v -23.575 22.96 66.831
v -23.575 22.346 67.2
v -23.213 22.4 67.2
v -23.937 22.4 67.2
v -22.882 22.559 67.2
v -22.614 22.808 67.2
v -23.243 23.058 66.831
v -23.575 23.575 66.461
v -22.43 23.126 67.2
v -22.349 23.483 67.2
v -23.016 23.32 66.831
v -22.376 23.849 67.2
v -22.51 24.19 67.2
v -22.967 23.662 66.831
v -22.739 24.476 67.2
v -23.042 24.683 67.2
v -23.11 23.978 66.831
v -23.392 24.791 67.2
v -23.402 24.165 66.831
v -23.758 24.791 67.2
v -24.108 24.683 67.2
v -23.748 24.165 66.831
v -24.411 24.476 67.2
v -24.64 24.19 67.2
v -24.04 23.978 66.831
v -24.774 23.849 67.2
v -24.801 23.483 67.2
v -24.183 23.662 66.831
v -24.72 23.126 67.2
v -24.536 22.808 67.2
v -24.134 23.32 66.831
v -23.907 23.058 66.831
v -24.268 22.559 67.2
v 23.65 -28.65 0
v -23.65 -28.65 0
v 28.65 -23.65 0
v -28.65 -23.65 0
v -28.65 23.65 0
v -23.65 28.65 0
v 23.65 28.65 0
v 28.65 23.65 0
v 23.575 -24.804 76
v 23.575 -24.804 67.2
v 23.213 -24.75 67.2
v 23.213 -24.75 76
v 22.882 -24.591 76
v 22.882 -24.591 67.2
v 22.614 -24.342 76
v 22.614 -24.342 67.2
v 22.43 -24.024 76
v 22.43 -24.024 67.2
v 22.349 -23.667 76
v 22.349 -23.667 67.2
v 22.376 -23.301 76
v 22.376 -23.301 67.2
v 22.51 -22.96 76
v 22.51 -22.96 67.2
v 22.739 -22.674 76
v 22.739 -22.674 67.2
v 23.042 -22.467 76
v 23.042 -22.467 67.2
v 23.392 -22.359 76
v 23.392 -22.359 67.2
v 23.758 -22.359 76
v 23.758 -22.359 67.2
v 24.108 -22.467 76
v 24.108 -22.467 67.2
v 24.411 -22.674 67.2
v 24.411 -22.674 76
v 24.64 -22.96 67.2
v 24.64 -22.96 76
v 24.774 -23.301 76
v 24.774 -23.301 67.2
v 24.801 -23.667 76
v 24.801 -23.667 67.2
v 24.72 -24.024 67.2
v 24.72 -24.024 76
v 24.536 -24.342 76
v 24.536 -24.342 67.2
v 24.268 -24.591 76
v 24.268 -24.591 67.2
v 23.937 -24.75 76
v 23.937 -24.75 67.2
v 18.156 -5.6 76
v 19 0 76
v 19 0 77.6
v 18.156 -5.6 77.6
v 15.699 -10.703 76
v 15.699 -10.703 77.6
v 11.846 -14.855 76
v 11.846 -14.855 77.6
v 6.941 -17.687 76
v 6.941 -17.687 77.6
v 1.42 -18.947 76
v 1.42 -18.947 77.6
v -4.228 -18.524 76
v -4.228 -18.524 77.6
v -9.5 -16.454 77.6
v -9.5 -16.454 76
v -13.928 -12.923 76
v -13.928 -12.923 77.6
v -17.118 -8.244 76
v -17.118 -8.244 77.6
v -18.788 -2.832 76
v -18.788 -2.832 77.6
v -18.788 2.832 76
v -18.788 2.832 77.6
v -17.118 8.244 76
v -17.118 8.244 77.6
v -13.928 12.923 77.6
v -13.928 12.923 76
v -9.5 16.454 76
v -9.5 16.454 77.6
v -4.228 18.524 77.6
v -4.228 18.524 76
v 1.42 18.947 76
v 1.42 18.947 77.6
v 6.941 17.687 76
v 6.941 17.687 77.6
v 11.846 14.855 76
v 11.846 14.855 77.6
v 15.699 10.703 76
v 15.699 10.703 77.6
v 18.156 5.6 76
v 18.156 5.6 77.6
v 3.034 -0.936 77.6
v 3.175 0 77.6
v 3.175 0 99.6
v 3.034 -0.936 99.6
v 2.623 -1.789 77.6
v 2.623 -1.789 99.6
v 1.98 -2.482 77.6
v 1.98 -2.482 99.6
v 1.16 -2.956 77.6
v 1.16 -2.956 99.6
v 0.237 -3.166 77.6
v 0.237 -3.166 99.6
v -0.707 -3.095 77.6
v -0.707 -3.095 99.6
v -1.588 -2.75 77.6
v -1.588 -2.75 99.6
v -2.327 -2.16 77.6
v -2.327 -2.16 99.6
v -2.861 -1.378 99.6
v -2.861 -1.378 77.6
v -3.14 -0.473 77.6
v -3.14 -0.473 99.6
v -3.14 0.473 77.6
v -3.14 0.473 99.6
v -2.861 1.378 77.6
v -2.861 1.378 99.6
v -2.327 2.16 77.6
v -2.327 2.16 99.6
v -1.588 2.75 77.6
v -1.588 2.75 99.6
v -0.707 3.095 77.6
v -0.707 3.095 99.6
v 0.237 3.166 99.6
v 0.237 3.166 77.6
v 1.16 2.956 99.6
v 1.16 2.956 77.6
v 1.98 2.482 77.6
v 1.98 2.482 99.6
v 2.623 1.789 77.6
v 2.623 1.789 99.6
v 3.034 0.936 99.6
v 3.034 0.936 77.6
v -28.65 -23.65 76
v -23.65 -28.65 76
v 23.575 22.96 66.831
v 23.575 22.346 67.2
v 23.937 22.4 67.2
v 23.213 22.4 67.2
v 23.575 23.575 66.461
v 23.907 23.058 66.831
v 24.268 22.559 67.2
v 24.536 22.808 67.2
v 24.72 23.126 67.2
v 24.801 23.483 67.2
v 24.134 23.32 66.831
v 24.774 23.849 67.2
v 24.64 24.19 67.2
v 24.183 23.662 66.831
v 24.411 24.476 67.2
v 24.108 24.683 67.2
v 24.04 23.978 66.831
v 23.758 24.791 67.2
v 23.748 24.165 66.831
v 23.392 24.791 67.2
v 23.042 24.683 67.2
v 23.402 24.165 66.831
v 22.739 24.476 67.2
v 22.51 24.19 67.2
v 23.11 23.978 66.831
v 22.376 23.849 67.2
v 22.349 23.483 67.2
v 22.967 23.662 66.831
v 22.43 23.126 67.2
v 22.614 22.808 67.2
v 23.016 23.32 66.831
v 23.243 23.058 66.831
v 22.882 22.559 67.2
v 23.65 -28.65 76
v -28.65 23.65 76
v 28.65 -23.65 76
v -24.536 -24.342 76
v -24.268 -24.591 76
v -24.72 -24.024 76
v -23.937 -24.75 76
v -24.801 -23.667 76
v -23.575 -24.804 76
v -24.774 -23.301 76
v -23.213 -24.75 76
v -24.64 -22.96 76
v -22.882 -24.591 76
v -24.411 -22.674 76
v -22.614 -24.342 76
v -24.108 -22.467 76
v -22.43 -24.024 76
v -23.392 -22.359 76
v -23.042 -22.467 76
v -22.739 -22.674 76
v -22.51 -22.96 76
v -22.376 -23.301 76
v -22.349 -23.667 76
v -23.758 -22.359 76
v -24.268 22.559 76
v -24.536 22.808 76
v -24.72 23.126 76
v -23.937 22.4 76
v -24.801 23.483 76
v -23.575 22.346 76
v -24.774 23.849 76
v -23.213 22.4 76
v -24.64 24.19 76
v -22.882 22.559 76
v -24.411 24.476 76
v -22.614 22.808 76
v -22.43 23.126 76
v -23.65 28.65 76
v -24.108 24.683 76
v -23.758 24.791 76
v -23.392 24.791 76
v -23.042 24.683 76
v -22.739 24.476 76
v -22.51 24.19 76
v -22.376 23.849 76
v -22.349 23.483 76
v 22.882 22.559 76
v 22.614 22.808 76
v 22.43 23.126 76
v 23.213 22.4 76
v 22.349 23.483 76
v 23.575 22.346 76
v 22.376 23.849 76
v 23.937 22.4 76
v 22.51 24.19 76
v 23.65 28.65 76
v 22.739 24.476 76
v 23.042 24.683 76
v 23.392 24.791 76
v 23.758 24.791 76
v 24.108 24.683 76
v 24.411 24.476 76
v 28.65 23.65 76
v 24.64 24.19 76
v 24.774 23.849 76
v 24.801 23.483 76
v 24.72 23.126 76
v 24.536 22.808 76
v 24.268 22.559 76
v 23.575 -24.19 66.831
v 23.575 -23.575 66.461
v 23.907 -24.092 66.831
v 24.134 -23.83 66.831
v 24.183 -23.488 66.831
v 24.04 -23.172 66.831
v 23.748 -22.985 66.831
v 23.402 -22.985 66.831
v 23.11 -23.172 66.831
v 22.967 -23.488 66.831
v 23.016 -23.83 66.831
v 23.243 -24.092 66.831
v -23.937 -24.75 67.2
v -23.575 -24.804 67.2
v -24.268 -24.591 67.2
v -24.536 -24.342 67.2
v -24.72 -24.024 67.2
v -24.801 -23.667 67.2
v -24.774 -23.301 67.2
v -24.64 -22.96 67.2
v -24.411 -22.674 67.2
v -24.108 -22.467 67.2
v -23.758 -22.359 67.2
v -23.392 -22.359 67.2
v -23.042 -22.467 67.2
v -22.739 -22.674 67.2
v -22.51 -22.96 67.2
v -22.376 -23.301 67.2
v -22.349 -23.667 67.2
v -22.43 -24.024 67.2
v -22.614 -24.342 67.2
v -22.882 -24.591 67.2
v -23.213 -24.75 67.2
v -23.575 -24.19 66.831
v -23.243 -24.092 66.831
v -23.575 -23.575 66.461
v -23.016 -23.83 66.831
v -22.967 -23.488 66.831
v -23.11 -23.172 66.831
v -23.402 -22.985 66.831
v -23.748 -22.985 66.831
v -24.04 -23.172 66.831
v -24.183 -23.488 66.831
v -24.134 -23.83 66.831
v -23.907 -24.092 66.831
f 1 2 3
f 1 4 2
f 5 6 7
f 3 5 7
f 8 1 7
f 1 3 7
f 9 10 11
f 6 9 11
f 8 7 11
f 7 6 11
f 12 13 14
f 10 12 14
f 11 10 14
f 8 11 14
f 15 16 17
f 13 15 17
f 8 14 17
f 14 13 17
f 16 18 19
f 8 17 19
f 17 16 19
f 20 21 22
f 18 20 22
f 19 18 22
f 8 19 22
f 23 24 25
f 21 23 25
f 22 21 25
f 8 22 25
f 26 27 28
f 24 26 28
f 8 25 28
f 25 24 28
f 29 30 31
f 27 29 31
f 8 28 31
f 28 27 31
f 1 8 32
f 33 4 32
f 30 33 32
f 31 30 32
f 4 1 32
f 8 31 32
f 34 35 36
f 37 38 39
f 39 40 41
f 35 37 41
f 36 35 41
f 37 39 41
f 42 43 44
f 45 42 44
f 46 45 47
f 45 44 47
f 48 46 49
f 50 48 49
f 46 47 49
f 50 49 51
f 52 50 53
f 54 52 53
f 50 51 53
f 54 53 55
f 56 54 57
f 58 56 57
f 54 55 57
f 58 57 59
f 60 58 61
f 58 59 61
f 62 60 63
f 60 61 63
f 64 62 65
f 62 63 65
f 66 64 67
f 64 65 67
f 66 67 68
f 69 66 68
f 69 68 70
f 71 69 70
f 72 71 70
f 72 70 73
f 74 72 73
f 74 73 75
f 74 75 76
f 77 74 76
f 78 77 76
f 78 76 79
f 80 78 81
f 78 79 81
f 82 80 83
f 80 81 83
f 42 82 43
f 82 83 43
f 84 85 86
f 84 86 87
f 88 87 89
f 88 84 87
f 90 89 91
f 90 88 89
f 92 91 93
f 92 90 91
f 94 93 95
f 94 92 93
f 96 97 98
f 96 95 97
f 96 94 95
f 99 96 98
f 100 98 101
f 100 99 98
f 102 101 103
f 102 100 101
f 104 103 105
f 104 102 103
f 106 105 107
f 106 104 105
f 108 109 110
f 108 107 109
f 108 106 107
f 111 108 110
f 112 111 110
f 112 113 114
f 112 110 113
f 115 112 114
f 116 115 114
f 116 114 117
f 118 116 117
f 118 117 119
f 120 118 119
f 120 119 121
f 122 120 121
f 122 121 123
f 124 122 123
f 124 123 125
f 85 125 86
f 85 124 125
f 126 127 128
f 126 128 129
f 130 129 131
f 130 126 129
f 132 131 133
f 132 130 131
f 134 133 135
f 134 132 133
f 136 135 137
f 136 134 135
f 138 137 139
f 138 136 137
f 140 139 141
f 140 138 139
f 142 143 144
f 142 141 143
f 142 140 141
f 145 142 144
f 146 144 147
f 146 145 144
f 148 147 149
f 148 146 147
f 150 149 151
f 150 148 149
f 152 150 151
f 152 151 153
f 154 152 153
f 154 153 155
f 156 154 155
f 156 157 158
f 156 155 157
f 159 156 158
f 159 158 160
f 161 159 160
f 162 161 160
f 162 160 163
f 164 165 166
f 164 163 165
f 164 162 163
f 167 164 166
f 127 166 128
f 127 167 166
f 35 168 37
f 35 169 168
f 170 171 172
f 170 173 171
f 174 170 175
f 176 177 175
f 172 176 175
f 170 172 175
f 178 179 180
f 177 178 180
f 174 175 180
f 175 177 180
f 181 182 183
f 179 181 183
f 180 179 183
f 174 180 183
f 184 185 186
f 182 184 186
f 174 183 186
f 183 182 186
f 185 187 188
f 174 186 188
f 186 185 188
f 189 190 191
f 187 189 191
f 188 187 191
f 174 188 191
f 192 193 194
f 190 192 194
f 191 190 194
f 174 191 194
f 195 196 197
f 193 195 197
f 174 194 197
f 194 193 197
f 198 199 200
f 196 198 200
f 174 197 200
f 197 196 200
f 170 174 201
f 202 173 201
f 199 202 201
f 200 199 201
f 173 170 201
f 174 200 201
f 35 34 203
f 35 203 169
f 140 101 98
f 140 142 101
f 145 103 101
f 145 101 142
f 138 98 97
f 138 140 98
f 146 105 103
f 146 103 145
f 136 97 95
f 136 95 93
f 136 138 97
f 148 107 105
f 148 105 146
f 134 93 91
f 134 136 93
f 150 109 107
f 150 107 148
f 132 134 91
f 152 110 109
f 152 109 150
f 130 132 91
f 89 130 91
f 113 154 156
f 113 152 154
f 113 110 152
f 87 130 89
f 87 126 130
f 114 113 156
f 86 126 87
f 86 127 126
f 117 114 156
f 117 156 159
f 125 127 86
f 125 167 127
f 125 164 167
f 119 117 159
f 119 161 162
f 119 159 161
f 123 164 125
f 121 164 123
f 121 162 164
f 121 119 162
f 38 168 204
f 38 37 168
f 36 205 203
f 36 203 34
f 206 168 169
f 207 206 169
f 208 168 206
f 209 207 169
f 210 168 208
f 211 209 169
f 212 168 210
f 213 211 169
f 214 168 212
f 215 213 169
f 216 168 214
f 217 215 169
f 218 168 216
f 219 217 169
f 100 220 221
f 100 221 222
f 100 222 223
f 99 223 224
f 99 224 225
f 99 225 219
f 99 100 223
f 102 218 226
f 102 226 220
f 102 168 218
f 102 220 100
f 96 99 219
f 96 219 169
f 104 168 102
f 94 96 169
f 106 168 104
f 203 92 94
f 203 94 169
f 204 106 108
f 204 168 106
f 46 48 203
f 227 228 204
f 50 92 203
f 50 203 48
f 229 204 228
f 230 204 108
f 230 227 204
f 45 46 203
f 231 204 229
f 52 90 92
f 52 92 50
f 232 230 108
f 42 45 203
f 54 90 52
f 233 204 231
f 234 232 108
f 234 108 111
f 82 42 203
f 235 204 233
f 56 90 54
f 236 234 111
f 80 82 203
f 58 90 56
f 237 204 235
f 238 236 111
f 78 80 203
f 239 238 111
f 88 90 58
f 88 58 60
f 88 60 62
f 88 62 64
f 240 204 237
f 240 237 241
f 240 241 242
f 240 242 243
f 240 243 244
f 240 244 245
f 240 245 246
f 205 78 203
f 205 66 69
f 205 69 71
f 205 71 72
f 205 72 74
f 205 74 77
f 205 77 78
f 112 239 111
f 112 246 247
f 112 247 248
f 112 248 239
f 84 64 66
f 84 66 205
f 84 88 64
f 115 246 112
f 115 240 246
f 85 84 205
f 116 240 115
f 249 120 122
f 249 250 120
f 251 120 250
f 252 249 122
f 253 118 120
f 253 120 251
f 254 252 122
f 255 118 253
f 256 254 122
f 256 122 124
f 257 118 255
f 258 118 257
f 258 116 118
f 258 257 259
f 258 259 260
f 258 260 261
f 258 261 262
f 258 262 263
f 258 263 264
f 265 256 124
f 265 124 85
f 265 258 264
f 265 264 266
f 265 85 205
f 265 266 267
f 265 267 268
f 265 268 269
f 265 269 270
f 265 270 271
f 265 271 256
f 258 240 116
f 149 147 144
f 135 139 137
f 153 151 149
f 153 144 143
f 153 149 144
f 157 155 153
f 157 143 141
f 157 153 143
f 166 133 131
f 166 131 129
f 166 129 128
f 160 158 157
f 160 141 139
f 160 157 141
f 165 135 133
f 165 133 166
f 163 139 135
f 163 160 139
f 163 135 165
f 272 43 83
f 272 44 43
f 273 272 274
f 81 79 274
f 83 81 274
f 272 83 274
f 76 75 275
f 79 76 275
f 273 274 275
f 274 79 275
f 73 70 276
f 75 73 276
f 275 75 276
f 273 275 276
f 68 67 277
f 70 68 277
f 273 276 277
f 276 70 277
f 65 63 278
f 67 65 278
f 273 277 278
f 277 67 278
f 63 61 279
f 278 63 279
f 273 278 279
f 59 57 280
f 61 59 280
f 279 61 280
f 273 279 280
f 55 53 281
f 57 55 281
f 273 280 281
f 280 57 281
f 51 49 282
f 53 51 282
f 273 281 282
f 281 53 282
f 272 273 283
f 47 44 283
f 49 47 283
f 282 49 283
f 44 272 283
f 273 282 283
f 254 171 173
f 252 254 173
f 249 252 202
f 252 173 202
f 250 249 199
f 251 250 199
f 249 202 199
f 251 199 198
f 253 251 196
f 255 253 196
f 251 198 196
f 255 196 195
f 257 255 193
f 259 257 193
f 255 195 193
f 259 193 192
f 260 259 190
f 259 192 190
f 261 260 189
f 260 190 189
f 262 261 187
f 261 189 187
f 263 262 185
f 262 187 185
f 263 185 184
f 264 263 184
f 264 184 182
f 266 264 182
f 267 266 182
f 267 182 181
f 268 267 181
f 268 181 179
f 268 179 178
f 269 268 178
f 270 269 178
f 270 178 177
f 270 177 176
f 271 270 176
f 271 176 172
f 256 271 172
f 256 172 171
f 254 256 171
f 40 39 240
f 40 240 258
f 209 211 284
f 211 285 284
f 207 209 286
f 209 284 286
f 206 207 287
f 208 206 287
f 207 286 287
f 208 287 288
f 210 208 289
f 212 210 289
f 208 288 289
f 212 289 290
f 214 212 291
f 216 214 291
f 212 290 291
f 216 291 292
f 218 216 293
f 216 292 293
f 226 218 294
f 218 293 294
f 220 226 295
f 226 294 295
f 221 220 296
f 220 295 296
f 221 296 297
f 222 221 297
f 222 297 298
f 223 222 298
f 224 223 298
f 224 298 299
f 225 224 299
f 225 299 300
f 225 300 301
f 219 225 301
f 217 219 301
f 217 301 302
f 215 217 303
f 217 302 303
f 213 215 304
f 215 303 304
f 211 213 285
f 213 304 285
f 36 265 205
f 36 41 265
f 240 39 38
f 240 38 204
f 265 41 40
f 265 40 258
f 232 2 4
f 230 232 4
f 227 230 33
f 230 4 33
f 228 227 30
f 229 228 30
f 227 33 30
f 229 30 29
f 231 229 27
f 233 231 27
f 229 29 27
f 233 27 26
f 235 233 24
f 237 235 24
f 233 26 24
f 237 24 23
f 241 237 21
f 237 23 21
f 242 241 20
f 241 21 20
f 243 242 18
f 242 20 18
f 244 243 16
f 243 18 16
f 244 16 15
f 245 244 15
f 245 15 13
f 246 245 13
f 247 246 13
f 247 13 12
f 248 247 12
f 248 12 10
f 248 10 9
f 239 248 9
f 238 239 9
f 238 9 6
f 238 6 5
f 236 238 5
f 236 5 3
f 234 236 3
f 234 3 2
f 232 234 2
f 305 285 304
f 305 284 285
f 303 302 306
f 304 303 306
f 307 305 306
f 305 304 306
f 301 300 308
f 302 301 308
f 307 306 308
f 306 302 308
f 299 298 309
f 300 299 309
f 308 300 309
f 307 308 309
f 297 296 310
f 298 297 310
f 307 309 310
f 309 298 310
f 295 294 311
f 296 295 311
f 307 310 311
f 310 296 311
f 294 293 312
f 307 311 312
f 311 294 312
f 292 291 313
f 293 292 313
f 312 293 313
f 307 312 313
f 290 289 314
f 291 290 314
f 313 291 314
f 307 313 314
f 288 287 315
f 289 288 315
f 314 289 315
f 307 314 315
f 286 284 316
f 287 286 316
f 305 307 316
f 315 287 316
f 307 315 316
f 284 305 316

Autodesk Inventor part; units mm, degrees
ref_plane "YZ Plane" through (0, 0, 0) normal (1, 0, 0) x (0, 1, 0)
ref_plane "XZ Plane" through (0, 0, 0) normal (0, 1, 0) x (-1, 0, 0)
ref_plane "XY Plane" through (0, 0, 0) normal (0, 0, 1) x (1, 0, 0)
sketch "Skizze1" plane through (0, 0, 0) normal (0, 0, 1) x (1, 0, 0)
  line L0 (-40.11, 0) -> (40.11, 0) projected
  line L1 (0, -40.11) -> (0, 40.11) projected
  line L2 (28.65, -28.65) -> (-28.65, -28.65)
  line L3 (-28.65, -28.65) -> (-28.65, 28.65)
  line L4 (-28.65, 28.65) -> (28.65, 28.65)
  line L5 (28.65, 28.65) -> (28.65, -28.65)
  line L6 (28.65, -28.65) -> (-28.65, 28.65) construction
  line L7 (-28.65, -28.65) -> (28.65, 28.65) construction
  point P0 (0, 0)
  dimension "d0" = 57.3
  dimension "d1" = 57.3
extrude "Extrusion1" add sketch "Skizze1" along normal blind 76
sketch "Skizze2" plane through (0, 0, 76) normal (0, 0, 1) x (1, 0, 0)
  circle A0 centre (0, 0) radius 19
  dimension "d4" = 38
extrude "Extrusion2" add sketch "Skizze2" along normal blind 1.6
sketch "Skizze3" plane through (0, 0, 77.6) normal (0, 0, 1) x (1, 0, 0)
  circle A0 centre (0, 0) radius 3.175
  dimension "d7" = 6.35
extrude "Extrusion3" add sketch "Skizze3" along normal blind 22
sketch "Skizze4" plane through (0, 0, 76) normal (0, 0, 1) x (1, 0, 0)
  circle A0 centre (0, 0) radius 19 projected
  line L0 (28.65, 28.65) -> (-28.65, 28.65) projected
  line L1 (-28.65, 28.65) -> (-28.65, -28.65) projected
  line L2 (-28.65, -28.65) -> (28.65, -28.65) projected
  line L3 (28.65, -28.65) -> (28.65, 28.65) projected
  line L4 (23.575, -23.575) -> (-23.575, -23.575)
  line L5 (-23.575, -23.575) -> (-23.575, 23.575)
  line L6 (-23.575, 23.575) -> (23.575, 23.575)
  line L7 (23.575, 23.575) -> (23.575, -23.575)
  line L8 (23.575, -23.575) -> (-23.575, 23.575) construction
  line L9 (-23.575, -23.575) -> (23.575, 23.575) construction
  dimension "d10" = 47.15
  dimension "d11" = 47.15
hole "Bohrung1" at (-23.575, 23.575, 76) at (23.575, 23.575, 76) at (23.575, -23.575, 76) at (-23.575, -23.575, 76) direction (0, 0, -1) diameter 2.459 depth 8.8 tip angle 118 thread size "M3x0.5" class "6H" standard "ISO Metric profile"
chamfer "Fasen1" distance 5 angle 45 4 edges at (28.65, -28.65, 38) (28.65, 28.65, 38) (-28.65, 28.65, 38) (-28.65, -28.65, 38)
equation "\"d1\" = d0"
equation "\"d11\" = d10"
properties part number "Motor ST nema 23"
